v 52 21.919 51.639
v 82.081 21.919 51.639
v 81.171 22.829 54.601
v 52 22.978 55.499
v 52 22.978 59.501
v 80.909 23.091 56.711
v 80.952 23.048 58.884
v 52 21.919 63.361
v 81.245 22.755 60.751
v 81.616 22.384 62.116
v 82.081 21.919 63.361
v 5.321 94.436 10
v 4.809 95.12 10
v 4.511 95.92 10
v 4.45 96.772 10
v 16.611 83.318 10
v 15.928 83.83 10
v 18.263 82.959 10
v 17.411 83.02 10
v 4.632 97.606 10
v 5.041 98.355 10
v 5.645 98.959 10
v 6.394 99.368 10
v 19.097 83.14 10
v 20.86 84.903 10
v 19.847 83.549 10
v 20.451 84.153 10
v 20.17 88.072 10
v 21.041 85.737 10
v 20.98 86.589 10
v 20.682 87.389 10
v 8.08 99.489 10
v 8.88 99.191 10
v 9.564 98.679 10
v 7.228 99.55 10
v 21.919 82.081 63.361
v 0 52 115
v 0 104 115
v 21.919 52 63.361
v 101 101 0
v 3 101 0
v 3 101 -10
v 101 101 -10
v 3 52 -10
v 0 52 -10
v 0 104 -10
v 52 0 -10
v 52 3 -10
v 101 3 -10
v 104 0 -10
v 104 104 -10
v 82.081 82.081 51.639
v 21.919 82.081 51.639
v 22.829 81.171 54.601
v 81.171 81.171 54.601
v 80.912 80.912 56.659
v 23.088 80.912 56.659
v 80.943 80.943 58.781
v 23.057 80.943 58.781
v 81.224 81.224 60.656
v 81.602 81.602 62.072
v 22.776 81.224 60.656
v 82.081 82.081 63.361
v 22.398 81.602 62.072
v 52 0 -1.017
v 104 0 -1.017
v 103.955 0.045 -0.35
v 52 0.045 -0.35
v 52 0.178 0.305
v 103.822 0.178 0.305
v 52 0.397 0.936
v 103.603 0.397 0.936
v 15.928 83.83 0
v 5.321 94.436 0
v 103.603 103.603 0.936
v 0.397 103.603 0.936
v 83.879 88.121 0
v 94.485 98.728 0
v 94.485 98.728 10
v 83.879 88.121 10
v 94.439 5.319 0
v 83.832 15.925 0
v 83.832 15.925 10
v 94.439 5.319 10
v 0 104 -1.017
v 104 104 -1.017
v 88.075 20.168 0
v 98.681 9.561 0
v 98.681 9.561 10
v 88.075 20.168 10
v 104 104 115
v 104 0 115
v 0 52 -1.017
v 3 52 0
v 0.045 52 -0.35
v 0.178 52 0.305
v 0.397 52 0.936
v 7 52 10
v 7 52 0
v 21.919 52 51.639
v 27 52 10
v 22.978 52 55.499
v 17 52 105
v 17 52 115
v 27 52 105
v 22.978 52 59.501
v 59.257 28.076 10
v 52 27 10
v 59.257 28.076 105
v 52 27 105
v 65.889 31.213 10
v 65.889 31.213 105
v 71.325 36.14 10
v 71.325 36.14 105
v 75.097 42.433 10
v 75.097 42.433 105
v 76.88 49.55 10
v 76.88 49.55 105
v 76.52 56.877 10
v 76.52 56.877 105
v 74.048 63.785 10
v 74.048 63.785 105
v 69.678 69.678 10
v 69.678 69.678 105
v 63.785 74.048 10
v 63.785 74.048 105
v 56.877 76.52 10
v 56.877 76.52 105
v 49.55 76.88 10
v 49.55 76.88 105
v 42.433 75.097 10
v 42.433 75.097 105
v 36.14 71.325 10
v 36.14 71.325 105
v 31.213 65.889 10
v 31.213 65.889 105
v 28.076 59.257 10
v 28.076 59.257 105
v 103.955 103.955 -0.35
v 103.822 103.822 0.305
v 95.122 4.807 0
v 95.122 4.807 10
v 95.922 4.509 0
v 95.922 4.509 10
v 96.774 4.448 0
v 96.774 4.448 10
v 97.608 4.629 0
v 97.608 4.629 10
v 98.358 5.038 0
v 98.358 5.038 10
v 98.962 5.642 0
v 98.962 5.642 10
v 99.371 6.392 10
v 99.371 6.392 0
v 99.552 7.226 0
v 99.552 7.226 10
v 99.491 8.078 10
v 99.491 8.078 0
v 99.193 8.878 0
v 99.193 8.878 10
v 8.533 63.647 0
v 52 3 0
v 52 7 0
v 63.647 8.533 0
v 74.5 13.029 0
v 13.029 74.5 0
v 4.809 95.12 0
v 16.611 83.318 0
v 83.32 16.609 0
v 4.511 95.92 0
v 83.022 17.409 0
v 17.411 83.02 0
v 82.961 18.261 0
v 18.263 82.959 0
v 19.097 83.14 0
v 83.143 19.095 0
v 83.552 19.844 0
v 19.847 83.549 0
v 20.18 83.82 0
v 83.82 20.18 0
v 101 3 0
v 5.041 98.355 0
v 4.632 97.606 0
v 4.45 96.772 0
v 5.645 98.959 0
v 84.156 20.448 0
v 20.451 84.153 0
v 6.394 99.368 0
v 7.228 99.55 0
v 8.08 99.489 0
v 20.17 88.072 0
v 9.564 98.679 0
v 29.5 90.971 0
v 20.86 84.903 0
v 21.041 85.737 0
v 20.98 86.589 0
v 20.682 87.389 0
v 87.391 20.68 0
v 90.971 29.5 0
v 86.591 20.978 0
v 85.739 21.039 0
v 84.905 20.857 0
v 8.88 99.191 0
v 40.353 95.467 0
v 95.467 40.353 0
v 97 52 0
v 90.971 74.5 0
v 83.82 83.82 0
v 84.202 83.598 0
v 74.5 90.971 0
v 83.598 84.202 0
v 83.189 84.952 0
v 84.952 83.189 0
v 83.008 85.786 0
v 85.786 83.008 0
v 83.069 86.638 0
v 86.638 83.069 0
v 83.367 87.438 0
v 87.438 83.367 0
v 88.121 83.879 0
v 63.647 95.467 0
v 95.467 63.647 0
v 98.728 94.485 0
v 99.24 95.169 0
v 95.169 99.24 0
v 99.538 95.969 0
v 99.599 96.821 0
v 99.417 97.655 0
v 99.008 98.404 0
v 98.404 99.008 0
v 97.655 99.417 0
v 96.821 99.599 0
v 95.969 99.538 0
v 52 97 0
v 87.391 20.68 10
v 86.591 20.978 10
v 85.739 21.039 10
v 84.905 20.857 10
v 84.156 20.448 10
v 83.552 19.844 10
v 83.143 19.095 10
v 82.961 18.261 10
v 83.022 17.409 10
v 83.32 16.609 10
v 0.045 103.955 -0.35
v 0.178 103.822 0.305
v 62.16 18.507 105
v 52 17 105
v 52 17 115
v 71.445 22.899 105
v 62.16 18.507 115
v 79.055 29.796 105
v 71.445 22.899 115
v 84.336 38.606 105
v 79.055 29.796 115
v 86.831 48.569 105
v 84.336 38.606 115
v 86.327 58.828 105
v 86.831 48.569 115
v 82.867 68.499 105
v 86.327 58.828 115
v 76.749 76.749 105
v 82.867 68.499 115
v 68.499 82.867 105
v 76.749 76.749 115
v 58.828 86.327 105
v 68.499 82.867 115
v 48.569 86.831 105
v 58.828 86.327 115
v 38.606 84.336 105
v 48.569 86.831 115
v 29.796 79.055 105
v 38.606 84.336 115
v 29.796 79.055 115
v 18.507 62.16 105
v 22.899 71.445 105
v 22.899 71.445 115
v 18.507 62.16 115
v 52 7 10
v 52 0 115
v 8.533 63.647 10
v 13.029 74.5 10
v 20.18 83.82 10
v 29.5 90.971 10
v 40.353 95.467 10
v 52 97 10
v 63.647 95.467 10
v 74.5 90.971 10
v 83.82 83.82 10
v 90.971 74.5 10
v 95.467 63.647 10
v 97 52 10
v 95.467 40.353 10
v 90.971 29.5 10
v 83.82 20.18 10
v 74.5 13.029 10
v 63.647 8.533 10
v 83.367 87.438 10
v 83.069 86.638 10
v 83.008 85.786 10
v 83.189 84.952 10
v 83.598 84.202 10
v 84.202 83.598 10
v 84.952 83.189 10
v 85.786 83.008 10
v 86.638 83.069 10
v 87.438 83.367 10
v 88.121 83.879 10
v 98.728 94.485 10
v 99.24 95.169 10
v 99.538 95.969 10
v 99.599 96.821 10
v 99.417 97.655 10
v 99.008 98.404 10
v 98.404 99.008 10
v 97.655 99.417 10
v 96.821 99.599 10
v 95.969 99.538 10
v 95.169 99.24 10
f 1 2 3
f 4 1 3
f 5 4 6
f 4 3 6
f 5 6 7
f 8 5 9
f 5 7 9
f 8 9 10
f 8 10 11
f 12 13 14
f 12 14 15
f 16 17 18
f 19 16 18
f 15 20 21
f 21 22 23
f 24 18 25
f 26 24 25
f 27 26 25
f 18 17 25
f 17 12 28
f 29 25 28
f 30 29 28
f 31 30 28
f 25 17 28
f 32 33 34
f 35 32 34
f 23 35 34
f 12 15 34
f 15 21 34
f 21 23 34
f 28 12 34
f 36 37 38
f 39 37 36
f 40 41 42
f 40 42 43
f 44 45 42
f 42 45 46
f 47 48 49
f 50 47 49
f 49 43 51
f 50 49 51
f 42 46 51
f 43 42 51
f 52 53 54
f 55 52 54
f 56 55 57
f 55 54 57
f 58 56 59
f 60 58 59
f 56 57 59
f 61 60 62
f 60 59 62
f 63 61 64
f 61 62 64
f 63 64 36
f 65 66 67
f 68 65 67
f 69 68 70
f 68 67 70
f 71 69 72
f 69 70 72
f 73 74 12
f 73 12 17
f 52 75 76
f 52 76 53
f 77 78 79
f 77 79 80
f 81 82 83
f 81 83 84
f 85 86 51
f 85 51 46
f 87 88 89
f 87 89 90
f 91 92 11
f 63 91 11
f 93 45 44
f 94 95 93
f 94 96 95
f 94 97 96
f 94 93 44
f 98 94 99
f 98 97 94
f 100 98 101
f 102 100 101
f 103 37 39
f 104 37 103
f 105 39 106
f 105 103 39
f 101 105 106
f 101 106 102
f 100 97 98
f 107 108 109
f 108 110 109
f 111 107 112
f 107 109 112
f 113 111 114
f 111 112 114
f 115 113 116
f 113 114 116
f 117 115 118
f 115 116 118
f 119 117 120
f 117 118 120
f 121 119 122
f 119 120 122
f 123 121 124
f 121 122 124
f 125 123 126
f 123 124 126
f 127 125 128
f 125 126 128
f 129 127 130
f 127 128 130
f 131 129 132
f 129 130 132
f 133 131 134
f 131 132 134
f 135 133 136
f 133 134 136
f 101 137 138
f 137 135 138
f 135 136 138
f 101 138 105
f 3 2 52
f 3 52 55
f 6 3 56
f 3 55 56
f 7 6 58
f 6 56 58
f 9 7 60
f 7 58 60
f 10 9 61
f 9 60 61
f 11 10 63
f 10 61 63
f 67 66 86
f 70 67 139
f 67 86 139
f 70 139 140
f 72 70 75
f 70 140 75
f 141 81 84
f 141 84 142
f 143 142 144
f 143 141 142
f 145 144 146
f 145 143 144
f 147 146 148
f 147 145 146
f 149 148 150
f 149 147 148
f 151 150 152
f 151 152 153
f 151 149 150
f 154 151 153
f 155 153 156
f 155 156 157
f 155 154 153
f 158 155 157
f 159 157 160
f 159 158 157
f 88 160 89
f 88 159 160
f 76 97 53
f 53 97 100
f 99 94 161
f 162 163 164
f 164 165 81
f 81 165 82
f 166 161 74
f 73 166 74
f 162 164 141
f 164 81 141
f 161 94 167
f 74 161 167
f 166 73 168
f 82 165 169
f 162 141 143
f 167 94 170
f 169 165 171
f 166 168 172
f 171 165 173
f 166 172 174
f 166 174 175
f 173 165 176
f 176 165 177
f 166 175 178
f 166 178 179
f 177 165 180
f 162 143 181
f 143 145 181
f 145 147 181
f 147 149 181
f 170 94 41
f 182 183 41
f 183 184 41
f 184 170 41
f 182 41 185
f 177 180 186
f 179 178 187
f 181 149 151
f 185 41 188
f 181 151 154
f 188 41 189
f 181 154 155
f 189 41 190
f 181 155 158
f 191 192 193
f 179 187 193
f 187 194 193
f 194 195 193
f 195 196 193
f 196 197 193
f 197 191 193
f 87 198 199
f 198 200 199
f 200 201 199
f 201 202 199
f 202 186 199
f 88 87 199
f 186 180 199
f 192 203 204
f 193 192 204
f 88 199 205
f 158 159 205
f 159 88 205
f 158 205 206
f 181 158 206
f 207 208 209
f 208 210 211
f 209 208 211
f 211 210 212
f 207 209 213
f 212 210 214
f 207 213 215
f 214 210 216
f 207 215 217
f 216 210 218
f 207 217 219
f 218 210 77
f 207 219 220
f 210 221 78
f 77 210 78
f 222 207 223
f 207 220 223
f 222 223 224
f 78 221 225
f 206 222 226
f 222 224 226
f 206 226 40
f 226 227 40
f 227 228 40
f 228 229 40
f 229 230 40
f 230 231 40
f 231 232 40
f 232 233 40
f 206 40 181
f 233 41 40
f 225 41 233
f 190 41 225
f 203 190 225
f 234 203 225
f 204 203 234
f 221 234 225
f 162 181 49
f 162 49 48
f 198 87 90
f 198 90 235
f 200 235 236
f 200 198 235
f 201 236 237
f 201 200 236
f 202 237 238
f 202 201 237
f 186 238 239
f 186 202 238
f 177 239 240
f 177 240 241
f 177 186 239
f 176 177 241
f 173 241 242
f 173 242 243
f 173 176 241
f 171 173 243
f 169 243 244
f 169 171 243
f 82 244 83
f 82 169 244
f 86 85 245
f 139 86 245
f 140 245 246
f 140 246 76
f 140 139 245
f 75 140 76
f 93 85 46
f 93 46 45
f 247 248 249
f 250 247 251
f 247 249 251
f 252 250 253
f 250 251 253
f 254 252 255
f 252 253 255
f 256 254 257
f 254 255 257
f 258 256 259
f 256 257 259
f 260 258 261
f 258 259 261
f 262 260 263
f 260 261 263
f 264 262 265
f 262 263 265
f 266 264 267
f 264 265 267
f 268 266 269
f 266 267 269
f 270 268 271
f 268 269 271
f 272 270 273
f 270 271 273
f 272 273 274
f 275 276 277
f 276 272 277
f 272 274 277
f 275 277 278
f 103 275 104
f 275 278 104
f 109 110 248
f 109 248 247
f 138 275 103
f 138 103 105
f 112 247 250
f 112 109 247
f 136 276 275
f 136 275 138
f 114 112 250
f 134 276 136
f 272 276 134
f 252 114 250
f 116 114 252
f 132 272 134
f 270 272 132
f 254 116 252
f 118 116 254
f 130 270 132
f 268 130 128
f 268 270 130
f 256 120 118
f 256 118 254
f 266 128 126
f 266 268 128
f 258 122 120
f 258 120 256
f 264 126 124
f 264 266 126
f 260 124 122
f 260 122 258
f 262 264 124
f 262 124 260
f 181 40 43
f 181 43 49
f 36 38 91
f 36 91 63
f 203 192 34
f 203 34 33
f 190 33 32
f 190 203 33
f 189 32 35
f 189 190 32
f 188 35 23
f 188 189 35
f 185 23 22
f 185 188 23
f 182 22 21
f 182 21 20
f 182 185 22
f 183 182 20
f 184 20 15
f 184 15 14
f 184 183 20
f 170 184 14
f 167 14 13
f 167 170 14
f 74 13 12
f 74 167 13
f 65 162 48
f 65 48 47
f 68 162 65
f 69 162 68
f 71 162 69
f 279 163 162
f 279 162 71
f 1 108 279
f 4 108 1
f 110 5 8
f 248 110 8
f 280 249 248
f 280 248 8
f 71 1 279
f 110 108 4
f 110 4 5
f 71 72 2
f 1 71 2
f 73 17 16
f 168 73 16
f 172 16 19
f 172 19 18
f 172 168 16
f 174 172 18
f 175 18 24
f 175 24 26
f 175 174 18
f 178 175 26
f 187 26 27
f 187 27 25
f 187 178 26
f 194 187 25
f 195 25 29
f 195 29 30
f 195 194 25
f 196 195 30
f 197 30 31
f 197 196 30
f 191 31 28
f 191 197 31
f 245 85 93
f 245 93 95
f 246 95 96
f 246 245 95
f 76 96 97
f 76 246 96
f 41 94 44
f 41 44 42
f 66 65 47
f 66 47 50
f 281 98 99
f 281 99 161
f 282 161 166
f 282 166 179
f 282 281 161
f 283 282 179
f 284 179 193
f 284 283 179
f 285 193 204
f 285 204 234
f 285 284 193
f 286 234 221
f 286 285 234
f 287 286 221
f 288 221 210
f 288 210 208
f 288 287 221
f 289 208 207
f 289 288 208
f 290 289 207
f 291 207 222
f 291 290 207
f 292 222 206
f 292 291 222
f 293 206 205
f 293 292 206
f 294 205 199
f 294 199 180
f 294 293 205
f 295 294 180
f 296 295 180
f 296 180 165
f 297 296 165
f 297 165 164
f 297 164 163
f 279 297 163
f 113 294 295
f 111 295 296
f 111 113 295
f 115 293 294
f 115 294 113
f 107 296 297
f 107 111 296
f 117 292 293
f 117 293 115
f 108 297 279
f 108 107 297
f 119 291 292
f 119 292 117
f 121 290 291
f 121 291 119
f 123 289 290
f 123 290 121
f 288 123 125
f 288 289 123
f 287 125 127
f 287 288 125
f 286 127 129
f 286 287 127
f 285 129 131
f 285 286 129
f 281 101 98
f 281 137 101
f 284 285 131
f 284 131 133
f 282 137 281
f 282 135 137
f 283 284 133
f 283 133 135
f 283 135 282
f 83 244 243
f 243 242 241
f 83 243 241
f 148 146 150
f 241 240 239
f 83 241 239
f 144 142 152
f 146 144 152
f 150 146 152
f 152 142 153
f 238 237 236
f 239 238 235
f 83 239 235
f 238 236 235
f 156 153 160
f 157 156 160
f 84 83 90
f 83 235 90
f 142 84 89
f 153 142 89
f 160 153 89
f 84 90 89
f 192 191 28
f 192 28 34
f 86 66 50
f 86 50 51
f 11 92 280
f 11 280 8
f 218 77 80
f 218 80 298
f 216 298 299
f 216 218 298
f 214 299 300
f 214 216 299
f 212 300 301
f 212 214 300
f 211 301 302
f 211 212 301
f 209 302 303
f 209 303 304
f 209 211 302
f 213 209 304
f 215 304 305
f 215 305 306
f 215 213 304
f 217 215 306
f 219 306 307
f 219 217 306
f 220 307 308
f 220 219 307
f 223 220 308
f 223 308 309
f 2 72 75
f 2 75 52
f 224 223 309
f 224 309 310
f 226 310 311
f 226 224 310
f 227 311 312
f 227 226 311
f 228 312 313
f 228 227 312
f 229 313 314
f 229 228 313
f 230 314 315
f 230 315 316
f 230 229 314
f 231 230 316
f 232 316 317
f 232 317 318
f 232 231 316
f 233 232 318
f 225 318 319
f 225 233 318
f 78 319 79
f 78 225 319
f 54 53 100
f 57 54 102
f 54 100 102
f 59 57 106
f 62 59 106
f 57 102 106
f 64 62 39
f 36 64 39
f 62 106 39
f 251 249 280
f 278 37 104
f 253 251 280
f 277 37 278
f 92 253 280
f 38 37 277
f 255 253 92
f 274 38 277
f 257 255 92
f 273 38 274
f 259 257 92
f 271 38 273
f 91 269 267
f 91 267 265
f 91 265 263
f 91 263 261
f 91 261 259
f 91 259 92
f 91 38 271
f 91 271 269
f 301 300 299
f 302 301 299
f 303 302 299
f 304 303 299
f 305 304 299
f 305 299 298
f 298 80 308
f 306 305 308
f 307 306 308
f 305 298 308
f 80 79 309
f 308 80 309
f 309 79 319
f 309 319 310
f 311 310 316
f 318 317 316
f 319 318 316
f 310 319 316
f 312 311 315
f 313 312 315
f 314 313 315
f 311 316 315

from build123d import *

# Parameters (mm, degrees)
SKETCH4_W               = 104
SKETCH4_H               = 104
BOSS_EXTRUDE2_DEPTH     = 57.5
BOSS_EXTRUDE2_TAPER     = 23
SKETCH6_R               = 25
CUT_EXTRUDE1_DEPTH      = 179.5
CUT_EXTRUDE_THIN1_START = 10
CUT_EXTRUDE_THIN1_DEPTH = 10
CUT_EXTRUDE3_DEPTH      = 124
SKETCH10_R              = 35
CUT_EXTRUDE4_DEPTH      = 10
FILLET9_R               = 15
FILLET10_R              = 15
BOSS_EXTRUDE5_DEPTH     = 10
FILLET16_R              = 5
FILLET17_R              = 5
CUT_EXTRUDE6_DEPTH      = 10
CUT_EXTRUDE7_DEPTH      = 10


with BuildPart() as part:
    # Sketch4 → Boss-Extrude2 (new body)
    with BuildSketch(Plane.XY):
        with Locations((52, 52)):
            Rectangle(SKETCH4_W, SKETCH4_H)
    boss_extrude2 = extrude(amount=BOSS_EXTRUDE2_DEPTH, taper=BOSS_EXTRUDE2_TAPER)

    # Mirror2: Boss-Extrude2 across plane
    add(boss_extrude2.mirror(Plane(origin=(0, 0, 57.5), x_dir=(1, 0, 0), z_dir=(0, 0, -1))))

    # Sketch6 → Cut-Extrude1 (cut)
    with BuildSketch(Plane.XY.offset(115)):
        with Locations((52, 52)):
            Circle(SKETCH6_R)
    extrude(amount=-CUT_EXTRUDE1_DEPTH, mode=Mode.SUBTRACT)

    # Sketch8 → Cut-Extrude-Thin1 (cut)
    with BuildSketch(Plane.XY.offset(CUT_EXTRUDE_THIN1_START)):
        with BuildLine():
            ThreePointArc((52, 17), (76.748737342, 76.748737342), (17, 52))
            Line((17, 52), (7, 52))
            ThreePointArc((7, 52), (83.819805153, 83.819805153), (52, 7))
            Line((52, 7), (52, 17))
        make_face()
        with BuildLine():
            ThreePointArc((52, 27), (69.67766953, 69.67766953), (27, 52))
            Line((27, 52), (17, 52))
            ThreePointArc((17, 52), (76.748737342, 76.748737342), (52, 17))
            Line((52, 17), (52, 27))
        make_face()
    extrude(amount=-CUT_EXTRUDE_THIN1_DEPTH, mode=Mode.SUBTRACT)

    # Sketch9 → Cut-Extrude3 (cut)
    with BuildSketch(Plane(origin=(0, 0, 0), x_dir=(-1, 0, 0), z_dir=(0, 0, -1))):
        Polygon((-27, 52), (0, 52), (0, 0), (-52, 0), (-52, 27), (-52, 52), align=None)
    extrude(amount=-CUT_EXTRUDE3_DEPTH, mode=Mode.SUBTRACT)

    # Sketch10 → Cut-Extrude4 (cut)
    with BuildSketch(Plane.XY.offset(115)):
        with Locations((52, 52)):
            Circle(SKETCH10_R)
    extrude(amount=-CUT_EXTRUDE4_DEPTH, mode=Mode.SUBTRACT)

    # Fillet9
    fillet9_edges = [part.edges().sort_by_distance(p)[0] for p in [
        (65.796349034, 24.407301932, 57.5),
    ]]
    fillet(fillet9_edges, radius=FILLET9_R)

    # Fillet10
    fillet10_edges = [part.edges().sort_by_distance(p)[0] for p in [
        (24.407301932, 65.796349034, 57.5),
        (52, 79.592698068, 57.5),
        (79.592698068, 51.352297169, 57.5),
    ]]
    fillet(fillet10_edges, radius=FILLET10_R)

    # Sketch12 → Boss-Extrude5 (add)
    with BuildSketch(Plane(origin=(0, 0, 0), x_dir=(-1, 0, 0), z_dir=(0, 0, -1))):
        Polygon((-104, 104), (0, 104), (0, 52), (-3, 52), (-3, 101), (-101, 101), (-101, 3), (-52, 3), (-52, 0), (-104, 0), align=None)
    extrude(amount=BOSS_EXTRUDE5_DEPTH)

    # Fillet16
    fillet16_edges = [part.edges().sort_by_distance(p)[0] for p in [
        (78, 0, 0),
    ]]
    fillet(fillet16_edges, radius=FILLET16_R)

    # Fillet17
    fillet17_edges = [part.edges().sort_by_distance(p)[0] for p in [
        (0, 78, 0),
        (52, 104, 0),
        (104, 52.052287852, 0),
    ]]
    fillet(fillet17_edges, radius=FILLET17_R)

    # Sketch14 → Cut-Extrude6 (cut)
    with BuildSketch(Plane(origin=(0, 0, 0), x_dir=(-1, 0, 0), z_dir=(0, 0, -1))):
        with BuildLine():
            Line((-94.485281374, 98.727922061), (-83.878679656, 88.121320344))
            ThreePointArc((-83.878679656, 88.121320344), (-83.878679656, 83.878679656), (-88.121320344, 83.878679656))
            Line((-88.121320344, 83.878679656), (-98.727922061, 94.485281374))
            ThreePointArc((-98.727922061, 94.485281374), (-98.727922061, 98.727922061), (-94.485281374, 98.727922061))
        make_face()
    extrude(amount=-CUT_EXTRUDE6_DEPTH, mode=Mode.SUBTRACT)

    # Sketch15 → Cut-Extrude7 (cut)
    with BuildSketch(Plane(origin=(0, 0, 0), x_dir=(-1, 0, 0), z_dir=(0, 0, -1))):
        with BuildLine():
            Line((-20.170334378, 88.072306309), (-9.56373266, 98.678908027))
            ThreePointArc((-9.56373266, 98.678908027), (-5.321091973, 98.678908027), (-5.321091973, 94.43626734))
            Line((-5.321091973, 94.43626734), (-15.927693691, 83.829665622))
            ThreePointArc((-15.927693691, 83.829665622), (-20.170334378, 83.829665622), (-20.170334378, 88.072306309))
        make_face()
        with BuildLine():
            Line((-83.832077939, 15.925281374), (-94.438679656, 5.318679656))
            ThreePointArc((-94.438679656, 5.318679656), (-98.681320344, 5.318679656), (-98.681320344, 9.561320344))
            Line((-98.681320344, 9.561320344), (-88.074718626, 20.167922061))
            ThreePointArc((-88.074718626, 20.167922061), (-83.832077939, 20.167922061), (-83.832077939, 15.925281374))
        make_face()
    extrude(amount=-CUT_EXTRUDE7_DEPTH, mode=Mode.SUBTRACT)


solid = part.part
